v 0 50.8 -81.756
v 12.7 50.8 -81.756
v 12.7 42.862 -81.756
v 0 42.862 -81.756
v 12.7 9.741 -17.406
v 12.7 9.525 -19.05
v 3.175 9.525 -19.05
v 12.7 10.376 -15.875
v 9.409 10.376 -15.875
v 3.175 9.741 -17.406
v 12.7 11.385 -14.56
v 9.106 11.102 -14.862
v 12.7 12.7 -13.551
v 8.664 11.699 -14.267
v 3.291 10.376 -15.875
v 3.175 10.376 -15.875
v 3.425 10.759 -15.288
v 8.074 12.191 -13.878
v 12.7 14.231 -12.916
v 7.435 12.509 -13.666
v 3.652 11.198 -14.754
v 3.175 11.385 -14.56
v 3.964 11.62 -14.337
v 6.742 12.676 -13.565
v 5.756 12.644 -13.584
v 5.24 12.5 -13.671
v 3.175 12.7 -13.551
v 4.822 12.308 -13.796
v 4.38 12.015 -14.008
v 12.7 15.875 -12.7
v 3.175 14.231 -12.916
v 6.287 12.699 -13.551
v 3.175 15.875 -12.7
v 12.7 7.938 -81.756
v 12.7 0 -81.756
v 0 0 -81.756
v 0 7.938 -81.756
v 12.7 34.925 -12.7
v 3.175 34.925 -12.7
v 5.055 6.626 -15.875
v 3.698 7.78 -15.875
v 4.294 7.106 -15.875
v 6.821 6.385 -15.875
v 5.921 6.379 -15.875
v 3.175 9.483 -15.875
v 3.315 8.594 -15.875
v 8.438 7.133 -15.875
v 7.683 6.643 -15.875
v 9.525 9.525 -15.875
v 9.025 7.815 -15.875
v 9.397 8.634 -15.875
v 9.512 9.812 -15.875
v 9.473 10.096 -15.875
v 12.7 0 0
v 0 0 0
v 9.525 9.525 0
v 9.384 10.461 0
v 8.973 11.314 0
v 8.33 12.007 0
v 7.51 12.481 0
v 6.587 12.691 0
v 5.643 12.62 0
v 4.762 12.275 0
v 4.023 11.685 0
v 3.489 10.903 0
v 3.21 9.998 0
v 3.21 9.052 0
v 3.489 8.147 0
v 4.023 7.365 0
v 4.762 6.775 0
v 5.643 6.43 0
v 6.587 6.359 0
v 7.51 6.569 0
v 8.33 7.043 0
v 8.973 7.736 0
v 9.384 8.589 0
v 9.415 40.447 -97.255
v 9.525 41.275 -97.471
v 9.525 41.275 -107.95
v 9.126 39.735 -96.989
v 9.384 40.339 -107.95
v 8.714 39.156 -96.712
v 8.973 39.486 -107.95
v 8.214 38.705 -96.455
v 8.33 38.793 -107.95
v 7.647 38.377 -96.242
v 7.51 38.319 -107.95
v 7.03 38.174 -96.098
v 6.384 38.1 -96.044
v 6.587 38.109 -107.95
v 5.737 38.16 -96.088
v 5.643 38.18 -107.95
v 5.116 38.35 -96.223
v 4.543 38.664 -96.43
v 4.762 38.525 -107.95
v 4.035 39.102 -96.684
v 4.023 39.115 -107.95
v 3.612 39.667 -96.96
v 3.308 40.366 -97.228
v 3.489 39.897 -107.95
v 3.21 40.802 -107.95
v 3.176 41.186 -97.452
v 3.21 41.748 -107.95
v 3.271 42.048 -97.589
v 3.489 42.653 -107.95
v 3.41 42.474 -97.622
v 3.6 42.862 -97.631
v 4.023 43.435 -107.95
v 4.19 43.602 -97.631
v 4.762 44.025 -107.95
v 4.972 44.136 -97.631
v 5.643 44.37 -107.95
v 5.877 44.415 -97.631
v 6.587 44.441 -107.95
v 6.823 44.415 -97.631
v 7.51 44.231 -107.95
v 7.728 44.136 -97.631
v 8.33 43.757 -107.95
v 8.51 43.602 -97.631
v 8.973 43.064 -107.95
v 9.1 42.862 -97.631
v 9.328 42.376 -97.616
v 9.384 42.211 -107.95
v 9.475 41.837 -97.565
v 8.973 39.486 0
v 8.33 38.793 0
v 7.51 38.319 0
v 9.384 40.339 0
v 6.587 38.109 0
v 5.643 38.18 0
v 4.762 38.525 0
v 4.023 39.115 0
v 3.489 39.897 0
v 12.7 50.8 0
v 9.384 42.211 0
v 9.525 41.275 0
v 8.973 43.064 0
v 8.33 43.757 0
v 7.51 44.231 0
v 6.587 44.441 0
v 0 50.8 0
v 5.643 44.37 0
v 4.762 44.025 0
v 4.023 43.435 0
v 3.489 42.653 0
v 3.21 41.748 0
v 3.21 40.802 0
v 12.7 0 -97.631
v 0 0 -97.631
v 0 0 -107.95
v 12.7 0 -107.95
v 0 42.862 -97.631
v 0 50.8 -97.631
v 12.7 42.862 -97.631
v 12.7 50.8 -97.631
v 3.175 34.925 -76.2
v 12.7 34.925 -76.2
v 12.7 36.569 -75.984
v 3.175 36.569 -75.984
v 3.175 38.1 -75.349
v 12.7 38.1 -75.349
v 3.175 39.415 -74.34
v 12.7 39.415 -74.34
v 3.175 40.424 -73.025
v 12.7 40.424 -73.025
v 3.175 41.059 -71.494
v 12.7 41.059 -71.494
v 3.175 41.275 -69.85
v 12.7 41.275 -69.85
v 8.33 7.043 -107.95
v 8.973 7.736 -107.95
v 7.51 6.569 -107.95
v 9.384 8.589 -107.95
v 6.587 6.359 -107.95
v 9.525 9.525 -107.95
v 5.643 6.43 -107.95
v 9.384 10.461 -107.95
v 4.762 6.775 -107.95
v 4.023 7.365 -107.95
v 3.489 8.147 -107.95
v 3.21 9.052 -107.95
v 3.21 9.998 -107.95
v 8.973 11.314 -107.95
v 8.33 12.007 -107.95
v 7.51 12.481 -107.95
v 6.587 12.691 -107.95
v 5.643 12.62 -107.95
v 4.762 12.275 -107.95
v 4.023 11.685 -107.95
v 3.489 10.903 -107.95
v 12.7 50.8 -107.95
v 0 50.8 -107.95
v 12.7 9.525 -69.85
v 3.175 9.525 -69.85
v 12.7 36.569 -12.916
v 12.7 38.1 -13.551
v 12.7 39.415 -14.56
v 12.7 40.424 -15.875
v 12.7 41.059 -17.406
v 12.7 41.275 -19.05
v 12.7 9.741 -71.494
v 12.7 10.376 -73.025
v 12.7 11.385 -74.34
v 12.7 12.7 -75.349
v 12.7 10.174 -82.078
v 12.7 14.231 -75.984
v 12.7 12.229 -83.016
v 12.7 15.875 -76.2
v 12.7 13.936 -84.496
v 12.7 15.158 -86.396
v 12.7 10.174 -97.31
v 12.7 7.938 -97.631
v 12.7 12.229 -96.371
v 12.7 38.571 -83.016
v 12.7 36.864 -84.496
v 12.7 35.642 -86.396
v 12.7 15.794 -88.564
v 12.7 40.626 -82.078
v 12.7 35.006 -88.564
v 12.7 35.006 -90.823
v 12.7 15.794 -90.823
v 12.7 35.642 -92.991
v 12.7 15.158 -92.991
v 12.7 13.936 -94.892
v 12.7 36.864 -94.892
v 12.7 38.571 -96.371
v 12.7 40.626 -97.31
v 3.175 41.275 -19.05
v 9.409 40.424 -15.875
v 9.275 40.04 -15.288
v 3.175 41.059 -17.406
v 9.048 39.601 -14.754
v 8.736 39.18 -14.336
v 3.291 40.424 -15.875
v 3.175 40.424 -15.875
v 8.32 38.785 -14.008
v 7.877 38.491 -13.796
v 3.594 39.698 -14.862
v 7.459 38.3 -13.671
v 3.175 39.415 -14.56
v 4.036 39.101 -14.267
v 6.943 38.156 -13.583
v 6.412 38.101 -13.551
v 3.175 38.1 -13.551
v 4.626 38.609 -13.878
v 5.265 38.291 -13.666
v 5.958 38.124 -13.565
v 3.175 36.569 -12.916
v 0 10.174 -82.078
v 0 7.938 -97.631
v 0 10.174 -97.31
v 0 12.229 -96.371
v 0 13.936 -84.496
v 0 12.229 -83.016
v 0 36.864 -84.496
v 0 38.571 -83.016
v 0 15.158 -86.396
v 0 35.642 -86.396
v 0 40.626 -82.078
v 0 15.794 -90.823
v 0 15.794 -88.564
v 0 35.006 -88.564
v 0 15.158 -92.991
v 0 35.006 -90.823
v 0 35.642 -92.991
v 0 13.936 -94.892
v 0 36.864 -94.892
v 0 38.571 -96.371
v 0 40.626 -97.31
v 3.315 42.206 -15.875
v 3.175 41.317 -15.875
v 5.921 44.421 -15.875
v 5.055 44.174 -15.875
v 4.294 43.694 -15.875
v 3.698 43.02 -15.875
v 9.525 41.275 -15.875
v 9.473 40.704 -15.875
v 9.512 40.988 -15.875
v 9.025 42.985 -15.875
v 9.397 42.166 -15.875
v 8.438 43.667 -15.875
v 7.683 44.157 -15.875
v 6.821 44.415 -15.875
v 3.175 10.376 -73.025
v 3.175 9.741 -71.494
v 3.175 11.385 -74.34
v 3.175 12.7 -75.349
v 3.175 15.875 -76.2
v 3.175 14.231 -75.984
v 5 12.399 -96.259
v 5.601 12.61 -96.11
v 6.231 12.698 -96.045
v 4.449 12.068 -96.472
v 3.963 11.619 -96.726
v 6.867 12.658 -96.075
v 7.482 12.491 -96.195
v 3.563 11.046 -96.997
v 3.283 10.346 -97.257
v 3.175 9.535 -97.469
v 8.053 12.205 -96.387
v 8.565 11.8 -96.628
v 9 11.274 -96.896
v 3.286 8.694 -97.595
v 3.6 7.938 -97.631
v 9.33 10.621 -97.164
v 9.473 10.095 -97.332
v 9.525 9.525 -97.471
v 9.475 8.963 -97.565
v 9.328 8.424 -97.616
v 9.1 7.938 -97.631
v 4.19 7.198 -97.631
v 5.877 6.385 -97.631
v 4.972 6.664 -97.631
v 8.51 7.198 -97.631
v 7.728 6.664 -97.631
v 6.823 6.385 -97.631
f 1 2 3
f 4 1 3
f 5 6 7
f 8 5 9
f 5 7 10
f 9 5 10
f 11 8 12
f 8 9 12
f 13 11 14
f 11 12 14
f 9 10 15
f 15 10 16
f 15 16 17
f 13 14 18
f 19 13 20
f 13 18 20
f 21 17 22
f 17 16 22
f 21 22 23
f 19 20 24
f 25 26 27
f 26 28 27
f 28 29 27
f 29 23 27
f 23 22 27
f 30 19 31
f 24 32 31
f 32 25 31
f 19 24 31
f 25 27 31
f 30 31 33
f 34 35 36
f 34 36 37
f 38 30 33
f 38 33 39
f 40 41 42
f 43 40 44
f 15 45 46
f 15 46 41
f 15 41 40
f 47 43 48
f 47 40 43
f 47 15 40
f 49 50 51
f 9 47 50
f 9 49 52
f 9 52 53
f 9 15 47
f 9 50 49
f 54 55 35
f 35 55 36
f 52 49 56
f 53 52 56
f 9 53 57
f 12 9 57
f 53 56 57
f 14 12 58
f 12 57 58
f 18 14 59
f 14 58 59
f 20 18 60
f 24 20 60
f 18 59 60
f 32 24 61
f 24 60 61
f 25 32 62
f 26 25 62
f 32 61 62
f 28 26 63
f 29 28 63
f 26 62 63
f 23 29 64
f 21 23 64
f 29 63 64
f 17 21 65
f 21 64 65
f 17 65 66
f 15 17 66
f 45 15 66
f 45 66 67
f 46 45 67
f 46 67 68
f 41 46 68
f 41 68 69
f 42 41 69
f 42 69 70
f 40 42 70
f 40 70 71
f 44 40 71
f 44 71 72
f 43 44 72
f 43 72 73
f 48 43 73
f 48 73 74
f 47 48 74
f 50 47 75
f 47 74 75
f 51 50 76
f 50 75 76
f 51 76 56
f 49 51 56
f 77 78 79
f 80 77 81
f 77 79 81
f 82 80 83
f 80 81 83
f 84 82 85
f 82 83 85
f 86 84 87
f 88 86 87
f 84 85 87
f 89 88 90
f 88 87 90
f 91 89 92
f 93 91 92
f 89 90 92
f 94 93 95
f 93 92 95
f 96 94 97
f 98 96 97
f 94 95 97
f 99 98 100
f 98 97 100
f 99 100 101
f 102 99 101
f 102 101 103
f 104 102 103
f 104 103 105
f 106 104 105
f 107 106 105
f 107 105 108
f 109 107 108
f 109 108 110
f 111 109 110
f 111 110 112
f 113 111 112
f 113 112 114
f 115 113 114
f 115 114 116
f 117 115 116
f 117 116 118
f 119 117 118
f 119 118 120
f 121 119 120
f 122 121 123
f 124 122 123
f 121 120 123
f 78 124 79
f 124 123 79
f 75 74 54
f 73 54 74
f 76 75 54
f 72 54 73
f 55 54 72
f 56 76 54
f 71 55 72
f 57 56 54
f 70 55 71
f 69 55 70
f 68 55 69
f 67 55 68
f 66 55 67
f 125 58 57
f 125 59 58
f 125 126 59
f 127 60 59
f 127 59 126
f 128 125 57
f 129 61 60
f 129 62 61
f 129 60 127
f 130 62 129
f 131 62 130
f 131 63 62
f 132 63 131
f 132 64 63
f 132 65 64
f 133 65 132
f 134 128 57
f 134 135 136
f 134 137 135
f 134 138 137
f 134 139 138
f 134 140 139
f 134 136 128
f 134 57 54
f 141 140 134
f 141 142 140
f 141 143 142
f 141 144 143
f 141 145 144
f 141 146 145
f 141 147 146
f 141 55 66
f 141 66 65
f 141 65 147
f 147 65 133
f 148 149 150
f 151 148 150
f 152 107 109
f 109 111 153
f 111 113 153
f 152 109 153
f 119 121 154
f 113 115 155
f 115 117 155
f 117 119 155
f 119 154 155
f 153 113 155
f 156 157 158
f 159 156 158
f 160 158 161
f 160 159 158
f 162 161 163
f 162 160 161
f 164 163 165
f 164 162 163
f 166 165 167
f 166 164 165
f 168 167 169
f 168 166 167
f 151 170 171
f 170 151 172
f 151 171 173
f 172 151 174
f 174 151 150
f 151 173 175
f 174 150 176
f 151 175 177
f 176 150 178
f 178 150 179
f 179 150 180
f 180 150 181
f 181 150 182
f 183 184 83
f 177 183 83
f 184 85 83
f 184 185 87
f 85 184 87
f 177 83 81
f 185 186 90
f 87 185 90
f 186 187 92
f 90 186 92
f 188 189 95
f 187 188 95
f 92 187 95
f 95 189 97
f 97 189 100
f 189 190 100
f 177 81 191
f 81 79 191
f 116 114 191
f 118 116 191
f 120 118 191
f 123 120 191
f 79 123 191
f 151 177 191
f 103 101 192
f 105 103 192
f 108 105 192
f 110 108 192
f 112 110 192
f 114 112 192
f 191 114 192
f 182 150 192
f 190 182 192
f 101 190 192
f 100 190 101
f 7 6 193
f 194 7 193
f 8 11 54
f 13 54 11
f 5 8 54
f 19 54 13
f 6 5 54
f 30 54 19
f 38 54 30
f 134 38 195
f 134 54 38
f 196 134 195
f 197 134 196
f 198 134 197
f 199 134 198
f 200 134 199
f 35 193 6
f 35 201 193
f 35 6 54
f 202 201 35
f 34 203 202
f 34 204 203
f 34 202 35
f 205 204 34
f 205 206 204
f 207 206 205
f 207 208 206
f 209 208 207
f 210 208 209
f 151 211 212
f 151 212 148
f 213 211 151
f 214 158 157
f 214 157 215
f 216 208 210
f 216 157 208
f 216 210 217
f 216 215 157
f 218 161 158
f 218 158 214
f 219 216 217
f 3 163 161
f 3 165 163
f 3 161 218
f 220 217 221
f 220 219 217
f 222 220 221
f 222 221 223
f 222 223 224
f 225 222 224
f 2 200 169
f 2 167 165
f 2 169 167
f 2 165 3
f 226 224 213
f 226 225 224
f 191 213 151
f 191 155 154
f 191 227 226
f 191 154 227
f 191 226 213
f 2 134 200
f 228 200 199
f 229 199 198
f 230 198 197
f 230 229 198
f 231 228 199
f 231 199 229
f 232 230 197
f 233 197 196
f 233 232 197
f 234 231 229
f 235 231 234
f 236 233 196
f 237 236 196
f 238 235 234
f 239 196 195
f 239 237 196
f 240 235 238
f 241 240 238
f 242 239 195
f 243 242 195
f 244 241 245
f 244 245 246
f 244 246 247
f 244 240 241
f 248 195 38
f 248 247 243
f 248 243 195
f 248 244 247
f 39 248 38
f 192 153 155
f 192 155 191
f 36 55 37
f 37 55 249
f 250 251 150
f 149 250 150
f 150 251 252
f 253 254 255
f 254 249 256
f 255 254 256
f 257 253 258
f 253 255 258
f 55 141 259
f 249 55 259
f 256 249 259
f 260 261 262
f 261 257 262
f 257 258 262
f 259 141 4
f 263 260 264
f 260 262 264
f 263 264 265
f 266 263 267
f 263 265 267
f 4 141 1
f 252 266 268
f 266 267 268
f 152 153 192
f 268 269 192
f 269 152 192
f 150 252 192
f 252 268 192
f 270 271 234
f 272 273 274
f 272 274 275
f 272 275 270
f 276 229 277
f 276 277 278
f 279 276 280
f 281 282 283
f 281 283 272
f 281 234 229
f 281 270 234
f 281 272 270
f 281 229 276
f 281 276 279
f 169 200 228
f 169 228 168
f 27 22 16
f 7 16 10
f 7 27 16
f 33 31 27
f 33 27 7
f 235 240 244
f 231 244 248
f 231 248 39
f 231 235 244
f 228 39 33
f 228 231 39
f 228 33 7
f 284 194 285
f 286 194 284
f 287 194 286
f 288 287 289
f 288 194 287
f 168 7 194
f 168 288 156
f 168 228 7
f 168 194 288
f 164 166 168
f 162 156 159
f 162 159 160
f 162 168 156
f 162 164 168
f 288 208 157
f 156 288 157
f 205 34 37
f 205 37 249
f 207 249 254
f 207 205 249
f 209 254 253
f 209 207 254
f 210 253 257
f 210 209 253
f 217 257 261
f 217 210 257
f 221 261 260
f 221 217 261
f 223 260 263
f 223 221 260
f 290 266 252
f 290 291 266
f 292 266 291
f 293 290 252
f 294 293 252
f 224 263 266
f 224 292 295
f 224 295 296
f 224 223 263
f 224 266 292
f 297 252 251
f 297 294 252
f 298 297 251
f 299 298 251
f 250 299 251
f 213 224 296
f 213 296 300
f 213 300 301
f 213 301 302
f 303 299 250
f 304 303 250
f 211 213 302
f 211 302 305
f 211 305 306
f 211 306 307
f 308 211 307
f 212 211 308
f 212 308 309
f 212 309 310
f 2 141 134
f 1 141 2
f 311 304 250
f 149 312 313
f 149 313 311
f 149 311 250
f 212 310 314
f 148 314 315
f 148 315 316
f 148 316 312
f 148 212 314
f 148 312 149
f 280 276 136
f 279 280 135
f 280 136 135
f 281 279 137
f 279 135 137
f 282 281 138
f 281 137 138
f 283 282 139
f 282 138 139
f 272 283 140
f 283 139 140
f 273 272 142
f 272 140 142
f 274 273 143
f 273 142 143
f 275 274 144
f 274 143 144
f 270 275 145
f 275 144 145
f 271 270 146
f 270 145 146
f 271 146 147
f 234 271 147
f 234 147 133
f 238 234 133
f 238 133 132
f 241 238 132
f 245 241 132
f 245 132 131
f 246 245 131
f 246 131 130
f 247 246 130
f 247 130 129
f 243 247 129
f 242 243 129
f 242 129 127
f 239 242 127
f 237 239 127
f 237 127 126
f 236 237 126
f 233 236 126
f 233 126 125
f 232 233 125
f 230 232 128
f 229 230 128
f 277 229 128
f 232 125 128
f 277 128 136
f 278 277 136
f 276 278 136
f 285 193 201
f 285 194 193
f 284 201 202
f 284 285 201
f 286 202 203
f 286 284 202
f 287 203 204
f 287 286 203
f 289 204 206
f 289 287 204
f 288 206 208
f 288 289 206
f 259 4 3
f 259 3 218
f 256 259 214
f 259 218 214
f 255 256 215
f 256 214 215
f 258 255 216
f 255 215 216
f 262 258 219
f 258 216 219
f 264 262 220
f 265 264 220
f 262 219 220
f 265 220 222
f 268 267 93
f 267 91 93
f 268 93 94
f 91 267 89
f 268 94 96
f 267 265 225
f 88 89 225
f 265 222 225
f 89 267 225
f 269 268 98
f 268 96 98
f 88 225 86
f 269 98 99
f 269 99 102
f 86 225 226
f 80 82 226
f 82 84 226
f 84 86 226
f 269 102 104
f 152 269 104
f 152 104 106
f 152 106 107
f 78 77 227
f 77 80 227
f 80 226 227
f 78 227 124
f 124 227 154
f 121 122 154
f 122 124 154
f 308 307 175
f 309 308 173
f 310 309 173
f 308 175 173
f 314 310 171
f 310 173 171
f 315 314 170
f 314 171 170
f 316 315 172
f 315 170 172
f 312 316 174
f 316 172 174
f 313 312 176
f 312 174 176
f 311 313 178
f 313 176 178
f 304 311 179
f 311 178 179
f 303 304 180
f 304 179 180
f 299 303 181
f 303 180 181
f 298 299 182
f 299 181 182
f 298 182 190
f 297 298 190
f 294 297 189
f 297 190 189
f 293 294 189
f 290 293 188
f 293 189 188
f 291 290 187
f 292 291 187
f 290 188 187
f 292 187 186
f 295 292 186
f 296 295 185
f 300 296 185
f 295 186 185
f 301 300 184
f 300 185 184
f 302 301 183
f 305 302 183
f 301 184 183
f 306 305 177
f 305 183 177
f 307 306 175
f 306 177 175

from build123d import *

# Parameters (mm, degrees)
SKETCH1_W          = 107.95
SKETCH1_H          = 50.8
EXTRUDE1_DEPTH     = 12.7
SKETCH2_W          = 63.5
SKETCH2_H          = 31.75
CUT_EXTRUDE1_DEPTH = 9.525
FILLET1_R          = 6.35
CUT_EXTRUDE2_DEPTH = 120.979717036
SKETCH4_R          = 3.175
CUT_EXTRUDE3_DEPTH = 15.875
CUT_EXTRUDE4_REACH = 121.98
SKETCH5_R          = 3.175


with BuildPart() as part:
    # Sketch1 → Extrude1 (new body)
    with BuildSketch(Plane(origin=(0, 0, 0), x_dir=(0, 0, -1), z_dir=(1, 0, 0))):
        with Locations((53.975, 25.4)):
            Rectangle(SKETCH1_W, SKETCH1_H)
    extrude(amount=EXTRUDE1_DEPTH)

    # Sketch2 → Cut-Extrude1 (cut)
    with BuildSketch(Plane(origin=(12.7, 0, 0), x_dir=(0, 0, -1), z_dir=(1, 0, 0))):
        with Locations((44.45, 25.4)):
            Rectangle(SKETCH2_W, SKETCH2_H)
    extrude(amount=-CUT_EXTRUDE1_DEPTH, mode=Mode.SUBTRACT)

    # Fillet1
    fillet1_edges = [part.edges().sort_by_distance(p)[0] for p in [
        (7.9375, 9.525, -12.7),
        (7.9375, 41.275, -12.7),
        (7.9375, 41.275, -76.2),
        (7.9375, 9.525, -76.2),
    ]]
    fillet(fillet1_edges, radius=FILLET1_R)

    # Sketch3 → Cut-Extrude2 (cut, through all)
    with BuildSketch(Plane(origin=(12.7, 0, 0), x_dir=(0, 0, -1), z_dir=(1, 0, 0))):
        with BuildLine():
            Line((97.63125, 50.8), (81.75625, 50.8))
            Line((81.75625, 50.8), (81.75625, 42.8625))
            ThreePointArc((81.75625, 42.8625), (89.69375, 34.925), (97.63125, 42.8625))
            Line((97.63125, 42.8625), (97.63125, 50.8))
        make_face()
        with BuildLine():
            Line((97.63125, 0), (81.75625, 0))
            Line((81.75625, 0), (81.75625, 7.9375))
            ThreePointArc((81.75625, 7.9375), (89.69375, 15.875), (97.63125, 7.9375))
            Line((97.63125, 7.9375), (97.63125, 0))
        make_face()
    extrude(amount=-CUT_EXTRUDE2_DEPTH, mode=Mode.SUBTRACT)

    # Sketch4 → Cut-Extrude3 (cut)
    with BuildSketch(Plane.XY):
        with Locations((6.35, 41.275)):
            Circle(SKETCH4_R)
        with Locations((6.35, 9.525)):
            Circle(SKETCH4_R)
    extrude(amount=-CUT_EXTRUDE3_DEPTH, mode=Mode.SUBTRACT)

    # Sketch5 → Cut-Extrude4 (cut, up to next)
    with BuildSketch(Plane(origin=(0, 0, -107.95), x_dir=(-1, 0, 0), z_dir=(0, 0, -1)), mode=Mode.PRIVATE) as cut_extrude4_sk1:
        with Locations(Location((-6.35, 41.275, 0), (0, 0, 180))):
            Circle(SKETCH5_R)
    cut_extrude4_tool1 = extrude(cut_extrude4_sk1.sketch, amount=-CUT_EXTRUDE4_REACH, mode=Mode.PRIVATE) & part.part
    # Sketch5 → Cut-Extrude4 (cut, up to next)
    with BuildSketch(Plane(origin=(0, 0, -107.95), x_dir=(-1, 0, 0), z_dir=(0, 0, -1)), mode=Mode.PRIVATE) as cut_extrude4_sk2:
        with Locations(Location((-6.35, 9.525, 0), (0, 0, 180))):
            Circle(SKETCH5_R)
    cut_extrude4_tool2 = extrude(cut_extrude4_sk2.sketch, amount=-CUT_EXTRUDE4_REACH, mode=Mode.PRIVATE) & part.part
    add(cut_extrude4_tool1.solids().sort_by_distance((6.35, 41.275, -107.95))[0], mode=Mode.SUBTRACT)
    add(cut_extrude4_tool2.solids().sort_by_distance((6.35, 9.525, -107.95))[0], mode=Mode.SUBTRACT)


solid = part.part
